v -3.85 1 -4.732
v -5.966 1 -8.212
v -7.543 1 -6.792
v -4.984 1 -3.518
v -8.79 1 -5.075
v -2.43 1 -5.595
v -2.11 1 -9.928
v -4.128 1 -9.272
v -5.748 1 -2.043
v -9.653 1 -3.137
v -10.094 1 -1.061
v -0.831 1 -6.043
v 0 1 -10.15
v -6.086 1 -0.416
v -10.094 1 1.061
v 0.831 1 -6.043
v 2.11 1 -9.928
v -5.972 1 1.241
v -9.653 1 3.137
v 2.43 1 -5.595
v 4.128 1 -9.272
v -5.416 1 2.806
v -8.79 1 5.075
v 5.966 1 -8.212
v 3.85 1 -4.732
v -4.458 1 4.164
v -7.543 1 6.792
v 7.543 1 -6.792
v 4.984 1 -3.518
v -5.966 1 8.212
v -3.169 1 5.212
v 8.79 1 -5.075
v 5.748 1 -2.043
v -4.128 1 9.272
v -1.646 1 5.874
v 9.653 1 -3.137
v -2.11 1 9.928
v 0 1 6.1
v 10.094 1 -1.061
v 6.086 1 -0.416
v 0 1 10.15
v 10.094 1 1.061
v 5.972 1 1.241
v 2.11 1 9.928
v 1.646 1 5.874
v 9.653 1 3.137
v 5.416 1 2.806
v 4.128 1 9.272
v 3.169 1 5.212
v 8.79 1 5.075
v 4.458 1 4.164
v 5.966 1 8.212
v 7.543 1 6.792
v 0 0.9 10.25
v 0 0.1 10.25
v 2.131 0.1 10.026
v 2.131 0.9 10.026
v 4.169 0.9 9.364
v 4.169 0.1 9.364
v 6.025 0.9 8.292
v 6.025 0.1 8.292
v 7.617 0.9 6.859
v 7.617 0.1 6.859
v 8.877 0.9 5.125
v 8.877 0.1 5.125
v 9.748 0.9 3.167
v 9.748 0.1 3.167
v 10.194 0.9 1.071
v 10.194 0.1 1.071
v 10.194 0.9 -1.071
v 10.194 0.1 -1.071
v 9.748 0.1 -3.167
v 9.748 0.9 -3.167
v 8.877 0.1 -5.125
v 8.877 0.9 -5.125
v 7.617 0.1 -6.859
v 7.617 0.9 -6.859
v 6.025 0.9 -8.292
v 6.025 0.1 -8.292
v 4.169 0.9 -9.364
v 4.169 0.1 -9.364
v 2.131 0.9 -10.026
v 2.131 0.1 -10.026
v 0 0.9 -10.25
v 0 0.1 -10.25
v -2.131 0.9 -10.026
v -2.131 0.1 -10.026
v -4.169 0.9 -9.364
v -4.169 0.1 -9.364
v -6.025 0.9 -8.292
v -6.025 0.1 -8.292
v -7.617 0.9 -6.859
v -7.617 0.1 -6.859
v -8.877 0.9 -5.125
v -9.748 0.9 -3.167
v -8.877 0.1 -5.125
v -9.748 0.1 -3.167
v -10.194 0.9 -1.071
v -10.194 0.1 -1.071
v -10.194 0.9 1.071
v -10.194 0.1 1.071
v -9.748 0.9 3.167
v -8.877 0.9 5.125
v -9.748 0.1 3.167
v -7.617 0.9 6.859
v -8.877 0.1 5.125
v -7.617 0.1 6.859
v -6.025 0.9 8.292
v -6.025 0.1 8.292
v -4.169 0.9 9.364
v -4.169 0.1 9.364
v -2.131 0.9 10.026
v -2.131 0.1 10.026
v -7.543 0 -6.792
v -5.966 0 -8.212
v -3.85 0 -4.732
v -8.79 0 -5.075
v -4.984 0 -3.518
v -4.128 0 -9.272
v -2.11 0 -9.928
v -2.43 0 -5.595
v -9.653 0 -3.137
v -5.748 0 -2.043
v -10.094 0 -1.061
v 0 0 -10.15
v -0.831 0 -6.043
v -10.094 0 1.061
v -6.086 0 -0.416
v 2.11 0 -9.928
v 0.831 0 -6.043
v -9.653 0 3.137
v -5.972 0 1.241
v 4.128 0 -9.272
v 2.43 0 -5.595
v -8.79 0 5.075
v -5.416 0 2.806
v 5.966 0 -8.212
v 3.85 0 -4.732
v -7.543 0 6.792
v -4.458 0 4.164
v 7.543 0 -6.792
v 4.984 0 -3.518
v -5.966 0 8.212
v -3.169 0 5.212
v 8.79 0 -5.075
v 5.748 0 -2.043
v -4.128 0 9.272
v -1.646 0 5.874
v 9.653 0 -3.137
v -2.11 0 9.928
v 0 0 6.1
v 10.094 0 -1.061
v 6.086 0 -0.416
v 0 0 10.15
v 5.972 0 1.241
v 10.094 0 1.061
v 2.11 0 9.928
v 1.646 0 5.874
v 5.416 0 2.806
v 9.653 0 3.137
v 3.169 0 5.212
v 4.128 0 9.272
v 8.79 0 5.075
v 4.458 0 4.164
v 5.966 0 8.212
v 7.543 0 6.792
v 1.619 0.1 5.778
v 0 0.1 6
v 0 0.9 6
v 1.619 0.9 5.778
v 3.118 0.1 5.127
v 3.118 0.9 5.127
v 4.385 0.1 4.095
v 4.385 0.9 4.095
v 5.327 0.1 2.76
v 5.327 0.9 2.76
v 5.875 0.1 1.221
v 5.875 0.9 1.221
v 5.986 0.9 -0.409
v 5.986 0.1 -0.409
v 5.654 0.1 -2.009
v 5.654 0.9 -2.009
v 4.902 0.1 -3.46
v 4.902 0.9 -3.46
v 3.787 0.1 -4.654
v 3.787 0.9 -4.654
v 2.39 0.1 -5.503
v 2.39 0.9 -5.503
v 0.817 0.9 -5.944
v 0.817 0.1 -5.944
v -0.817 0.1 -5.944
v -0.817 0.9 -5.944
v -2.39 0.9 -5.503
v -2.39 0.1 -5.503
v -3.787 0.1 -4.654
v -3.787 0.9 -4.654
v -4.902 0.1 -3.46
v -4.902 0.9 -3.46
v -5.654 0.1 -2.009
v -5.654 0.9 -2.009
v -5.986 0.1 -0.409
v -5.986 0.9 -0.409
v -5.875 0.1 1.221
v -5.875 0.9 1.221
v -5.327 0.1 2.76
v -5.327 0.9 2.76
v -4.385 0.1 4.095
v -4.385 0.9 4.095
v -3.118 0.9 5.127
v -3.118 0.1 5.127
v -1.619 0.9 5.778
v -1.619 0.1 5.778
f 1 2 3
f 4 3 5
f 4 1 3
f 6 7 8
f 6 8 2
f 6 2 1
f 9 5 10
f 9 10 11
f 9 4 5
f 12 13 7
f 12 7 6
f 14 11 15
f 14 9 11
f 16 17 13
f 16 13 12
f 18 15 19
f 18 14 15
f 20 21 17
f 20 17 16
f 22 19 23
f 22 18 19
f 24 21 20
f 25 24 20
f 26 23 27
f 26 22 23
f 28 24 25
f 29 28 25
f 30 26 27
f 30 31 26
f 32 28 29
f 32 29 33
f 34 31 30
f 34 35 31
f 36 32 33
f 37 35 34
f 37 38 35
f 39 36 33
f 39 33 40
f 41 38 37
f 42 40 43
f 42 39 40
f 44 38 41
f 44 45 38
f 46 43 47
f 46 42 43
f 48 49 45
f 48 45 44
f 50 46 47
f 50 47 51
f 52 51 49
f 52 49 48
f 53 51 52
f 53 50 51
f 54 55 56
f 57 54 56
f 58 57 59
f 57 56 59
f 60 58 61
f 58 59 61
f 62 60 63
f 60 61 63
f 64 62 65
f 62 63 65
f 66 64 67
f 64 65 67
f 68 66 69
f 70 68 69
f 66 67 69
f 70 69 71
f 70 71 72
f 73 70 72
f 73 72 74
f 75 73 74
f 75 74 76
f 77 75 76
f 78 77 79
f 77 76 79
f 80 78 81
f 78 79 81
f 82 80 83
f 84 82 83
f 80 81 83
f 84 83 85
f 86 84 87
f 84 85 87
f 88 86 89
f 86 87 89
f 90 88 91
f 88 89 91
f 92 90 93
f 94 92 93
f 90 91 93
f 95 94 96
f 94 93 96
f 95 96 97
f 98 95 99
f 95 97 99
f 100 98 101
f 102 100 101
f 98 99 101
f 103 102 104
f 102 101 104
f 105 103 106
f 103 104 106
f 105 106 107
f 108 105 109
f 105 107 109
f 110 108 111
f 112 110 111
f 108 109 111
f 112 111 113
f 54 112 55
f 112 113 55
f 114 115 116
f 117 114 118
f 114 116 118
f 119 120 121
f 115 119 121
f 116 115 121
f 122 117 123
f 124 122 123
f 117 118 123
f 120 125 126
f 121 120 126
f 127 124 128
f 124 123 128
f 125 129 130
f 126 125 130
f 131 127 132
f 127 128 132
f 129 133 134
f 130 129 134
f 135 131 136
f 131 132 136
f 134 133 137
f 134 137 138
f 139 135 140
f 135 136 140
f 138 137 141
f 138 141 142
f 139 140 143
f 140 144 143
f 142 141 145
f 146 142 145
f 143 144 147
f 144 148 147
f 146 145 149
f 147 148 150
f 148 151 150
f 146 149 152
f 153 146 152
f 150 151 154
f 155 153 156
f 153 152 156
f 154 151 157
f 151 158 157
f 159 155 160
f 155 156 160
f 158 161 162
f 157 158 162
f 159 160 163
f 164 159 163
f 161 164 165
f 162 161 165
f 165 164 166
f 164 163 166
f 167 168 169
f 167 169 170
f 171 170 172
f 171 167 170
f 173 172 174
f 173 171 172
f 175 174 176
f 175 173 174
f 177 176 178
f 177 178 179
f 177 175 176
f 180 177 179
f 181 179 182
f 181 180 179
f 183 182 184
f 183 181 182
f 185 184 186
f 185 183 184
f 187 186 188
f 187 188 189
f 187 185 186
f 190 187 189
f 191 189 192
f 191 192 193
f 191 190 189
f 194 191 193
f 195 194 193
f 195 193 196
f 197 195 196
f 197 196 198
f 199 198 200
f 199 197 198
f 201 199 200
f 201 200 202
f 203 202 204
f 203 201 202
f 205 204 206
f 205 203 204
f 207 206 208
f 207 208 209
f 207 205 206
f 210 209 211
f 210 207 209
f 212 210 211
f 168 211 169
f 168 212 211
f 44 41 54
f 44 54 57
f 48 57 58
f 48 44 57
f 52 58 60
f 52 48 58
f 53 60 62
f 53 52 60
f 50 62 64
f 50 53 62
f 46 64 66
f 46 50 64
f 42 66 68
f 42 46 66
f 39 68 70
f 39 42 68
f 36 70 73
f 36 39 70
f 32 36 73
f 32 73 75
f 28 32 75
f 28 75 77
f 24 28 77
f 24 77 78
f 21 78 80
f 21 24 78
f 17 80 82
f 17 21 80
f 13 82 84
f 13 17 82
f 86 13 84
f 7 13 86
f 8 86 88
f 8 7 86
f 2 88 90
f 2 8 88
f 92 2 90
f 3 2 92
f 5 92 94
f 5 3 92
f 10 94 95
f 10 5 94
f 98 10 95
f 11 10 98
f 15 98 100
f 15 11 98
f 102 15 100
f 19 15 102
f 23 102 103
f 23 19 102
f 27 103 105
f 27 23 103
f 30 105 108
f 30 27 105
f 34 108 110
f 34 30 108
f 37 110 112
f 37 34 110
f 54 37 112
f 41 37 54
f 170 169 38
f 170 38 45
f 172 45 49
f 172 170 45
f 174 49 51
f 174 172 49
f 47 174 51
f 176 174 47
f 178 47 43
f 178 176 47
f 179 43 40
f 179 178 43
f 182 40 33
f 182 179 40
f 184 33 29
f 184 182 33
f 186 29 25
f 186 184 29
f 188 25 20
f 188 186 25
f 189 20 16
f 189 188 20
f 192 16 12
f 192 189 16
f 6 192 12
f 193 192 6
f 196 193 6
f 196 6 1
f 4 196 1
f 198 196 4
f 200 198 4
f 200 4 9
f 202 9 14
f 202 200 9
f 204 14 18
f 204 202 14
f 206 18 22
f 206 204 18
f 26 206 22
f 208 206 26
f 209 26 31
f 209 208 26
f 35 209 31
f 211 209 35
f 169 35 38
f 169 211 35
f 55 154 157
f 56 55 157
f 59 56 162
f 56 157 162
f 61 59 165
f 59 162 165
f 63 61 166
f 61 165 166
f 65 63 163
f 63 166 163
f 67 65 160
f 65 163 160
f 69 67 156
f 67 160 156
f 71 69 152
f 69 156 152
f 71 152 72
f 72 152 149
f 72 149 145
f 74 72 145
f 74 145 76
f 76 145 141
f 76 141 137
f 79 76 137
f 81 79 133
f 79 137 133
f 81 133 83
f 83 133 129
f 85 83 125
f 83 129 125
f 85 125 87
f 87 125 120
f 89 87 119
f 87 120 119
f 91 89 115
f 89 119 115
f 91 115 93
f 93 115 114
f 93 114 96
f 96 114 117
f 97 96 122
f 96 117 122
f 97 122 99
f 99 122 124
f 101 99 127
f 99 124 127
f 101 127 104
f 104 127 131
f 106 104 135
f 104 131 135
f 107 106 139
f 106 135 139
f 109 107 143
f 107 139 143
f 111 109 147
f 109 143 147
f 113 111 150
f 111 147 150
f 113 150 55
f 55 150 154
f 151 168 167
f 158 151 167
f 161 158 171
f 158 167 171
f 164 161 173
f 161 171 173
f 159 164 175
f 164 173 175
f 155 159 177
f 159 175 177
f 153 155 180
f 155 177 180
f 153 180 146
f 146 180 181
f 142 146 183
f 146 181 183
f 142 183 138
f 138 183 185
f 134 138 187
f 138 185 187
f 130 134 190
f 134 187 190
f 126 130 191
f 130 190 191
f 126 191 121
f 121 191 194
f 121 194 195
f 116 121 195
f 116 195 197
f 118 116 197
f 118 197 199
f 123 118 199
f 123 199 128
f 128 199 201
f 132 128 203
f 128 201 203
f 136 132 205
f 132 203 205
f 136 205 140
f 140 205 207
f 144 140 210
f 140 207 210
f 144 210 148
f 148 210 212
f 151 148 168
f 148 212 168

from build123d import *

# Parameters (mm, degrees)
PROFILES_R    = 10.25
PROFILES_R_2  = 6
PROFILE_DEPTH = 1
OUTERC_SIZE   = 0.1
INNERC_SIZE   = 0.1


with BuildPart() as part:
    # ProfileS → Profile (new body)
    with BuildSketch(Plane(origin=(0, 0, 0), x_dir=(1, 0, 0), z_dir=(0, 1, 0))):
        with Locations(Location((0, 0, 0), (0, 0, 270))):
            Circle(PROFILES_R)
        with Locations(Location((0, 0, 0), (0, 0, 270))):
            Circle(PROFILES_R_2, mode=Mode.SUBTRACT)
    extrude(amount=PROFILE_DEPTH)

    # OuterC
    outerc_edges = [part.edges().sort_by_distance(p)[0] for p in [
        (0, 0, -10.25),
        (0, 1, -10.25),
    ]]
    chamfer(outerc_edges, length=OUTERC_SIZE)

    # InnerC
    innerc_edges = [part.edges().sort_by_distance(p)[0] for p in [
        (0, 0, -6),
        (0, 1, -6),
    ]]
    chamfer(innerc_edges, length=INNERC_SIZE)


solid = part.part
